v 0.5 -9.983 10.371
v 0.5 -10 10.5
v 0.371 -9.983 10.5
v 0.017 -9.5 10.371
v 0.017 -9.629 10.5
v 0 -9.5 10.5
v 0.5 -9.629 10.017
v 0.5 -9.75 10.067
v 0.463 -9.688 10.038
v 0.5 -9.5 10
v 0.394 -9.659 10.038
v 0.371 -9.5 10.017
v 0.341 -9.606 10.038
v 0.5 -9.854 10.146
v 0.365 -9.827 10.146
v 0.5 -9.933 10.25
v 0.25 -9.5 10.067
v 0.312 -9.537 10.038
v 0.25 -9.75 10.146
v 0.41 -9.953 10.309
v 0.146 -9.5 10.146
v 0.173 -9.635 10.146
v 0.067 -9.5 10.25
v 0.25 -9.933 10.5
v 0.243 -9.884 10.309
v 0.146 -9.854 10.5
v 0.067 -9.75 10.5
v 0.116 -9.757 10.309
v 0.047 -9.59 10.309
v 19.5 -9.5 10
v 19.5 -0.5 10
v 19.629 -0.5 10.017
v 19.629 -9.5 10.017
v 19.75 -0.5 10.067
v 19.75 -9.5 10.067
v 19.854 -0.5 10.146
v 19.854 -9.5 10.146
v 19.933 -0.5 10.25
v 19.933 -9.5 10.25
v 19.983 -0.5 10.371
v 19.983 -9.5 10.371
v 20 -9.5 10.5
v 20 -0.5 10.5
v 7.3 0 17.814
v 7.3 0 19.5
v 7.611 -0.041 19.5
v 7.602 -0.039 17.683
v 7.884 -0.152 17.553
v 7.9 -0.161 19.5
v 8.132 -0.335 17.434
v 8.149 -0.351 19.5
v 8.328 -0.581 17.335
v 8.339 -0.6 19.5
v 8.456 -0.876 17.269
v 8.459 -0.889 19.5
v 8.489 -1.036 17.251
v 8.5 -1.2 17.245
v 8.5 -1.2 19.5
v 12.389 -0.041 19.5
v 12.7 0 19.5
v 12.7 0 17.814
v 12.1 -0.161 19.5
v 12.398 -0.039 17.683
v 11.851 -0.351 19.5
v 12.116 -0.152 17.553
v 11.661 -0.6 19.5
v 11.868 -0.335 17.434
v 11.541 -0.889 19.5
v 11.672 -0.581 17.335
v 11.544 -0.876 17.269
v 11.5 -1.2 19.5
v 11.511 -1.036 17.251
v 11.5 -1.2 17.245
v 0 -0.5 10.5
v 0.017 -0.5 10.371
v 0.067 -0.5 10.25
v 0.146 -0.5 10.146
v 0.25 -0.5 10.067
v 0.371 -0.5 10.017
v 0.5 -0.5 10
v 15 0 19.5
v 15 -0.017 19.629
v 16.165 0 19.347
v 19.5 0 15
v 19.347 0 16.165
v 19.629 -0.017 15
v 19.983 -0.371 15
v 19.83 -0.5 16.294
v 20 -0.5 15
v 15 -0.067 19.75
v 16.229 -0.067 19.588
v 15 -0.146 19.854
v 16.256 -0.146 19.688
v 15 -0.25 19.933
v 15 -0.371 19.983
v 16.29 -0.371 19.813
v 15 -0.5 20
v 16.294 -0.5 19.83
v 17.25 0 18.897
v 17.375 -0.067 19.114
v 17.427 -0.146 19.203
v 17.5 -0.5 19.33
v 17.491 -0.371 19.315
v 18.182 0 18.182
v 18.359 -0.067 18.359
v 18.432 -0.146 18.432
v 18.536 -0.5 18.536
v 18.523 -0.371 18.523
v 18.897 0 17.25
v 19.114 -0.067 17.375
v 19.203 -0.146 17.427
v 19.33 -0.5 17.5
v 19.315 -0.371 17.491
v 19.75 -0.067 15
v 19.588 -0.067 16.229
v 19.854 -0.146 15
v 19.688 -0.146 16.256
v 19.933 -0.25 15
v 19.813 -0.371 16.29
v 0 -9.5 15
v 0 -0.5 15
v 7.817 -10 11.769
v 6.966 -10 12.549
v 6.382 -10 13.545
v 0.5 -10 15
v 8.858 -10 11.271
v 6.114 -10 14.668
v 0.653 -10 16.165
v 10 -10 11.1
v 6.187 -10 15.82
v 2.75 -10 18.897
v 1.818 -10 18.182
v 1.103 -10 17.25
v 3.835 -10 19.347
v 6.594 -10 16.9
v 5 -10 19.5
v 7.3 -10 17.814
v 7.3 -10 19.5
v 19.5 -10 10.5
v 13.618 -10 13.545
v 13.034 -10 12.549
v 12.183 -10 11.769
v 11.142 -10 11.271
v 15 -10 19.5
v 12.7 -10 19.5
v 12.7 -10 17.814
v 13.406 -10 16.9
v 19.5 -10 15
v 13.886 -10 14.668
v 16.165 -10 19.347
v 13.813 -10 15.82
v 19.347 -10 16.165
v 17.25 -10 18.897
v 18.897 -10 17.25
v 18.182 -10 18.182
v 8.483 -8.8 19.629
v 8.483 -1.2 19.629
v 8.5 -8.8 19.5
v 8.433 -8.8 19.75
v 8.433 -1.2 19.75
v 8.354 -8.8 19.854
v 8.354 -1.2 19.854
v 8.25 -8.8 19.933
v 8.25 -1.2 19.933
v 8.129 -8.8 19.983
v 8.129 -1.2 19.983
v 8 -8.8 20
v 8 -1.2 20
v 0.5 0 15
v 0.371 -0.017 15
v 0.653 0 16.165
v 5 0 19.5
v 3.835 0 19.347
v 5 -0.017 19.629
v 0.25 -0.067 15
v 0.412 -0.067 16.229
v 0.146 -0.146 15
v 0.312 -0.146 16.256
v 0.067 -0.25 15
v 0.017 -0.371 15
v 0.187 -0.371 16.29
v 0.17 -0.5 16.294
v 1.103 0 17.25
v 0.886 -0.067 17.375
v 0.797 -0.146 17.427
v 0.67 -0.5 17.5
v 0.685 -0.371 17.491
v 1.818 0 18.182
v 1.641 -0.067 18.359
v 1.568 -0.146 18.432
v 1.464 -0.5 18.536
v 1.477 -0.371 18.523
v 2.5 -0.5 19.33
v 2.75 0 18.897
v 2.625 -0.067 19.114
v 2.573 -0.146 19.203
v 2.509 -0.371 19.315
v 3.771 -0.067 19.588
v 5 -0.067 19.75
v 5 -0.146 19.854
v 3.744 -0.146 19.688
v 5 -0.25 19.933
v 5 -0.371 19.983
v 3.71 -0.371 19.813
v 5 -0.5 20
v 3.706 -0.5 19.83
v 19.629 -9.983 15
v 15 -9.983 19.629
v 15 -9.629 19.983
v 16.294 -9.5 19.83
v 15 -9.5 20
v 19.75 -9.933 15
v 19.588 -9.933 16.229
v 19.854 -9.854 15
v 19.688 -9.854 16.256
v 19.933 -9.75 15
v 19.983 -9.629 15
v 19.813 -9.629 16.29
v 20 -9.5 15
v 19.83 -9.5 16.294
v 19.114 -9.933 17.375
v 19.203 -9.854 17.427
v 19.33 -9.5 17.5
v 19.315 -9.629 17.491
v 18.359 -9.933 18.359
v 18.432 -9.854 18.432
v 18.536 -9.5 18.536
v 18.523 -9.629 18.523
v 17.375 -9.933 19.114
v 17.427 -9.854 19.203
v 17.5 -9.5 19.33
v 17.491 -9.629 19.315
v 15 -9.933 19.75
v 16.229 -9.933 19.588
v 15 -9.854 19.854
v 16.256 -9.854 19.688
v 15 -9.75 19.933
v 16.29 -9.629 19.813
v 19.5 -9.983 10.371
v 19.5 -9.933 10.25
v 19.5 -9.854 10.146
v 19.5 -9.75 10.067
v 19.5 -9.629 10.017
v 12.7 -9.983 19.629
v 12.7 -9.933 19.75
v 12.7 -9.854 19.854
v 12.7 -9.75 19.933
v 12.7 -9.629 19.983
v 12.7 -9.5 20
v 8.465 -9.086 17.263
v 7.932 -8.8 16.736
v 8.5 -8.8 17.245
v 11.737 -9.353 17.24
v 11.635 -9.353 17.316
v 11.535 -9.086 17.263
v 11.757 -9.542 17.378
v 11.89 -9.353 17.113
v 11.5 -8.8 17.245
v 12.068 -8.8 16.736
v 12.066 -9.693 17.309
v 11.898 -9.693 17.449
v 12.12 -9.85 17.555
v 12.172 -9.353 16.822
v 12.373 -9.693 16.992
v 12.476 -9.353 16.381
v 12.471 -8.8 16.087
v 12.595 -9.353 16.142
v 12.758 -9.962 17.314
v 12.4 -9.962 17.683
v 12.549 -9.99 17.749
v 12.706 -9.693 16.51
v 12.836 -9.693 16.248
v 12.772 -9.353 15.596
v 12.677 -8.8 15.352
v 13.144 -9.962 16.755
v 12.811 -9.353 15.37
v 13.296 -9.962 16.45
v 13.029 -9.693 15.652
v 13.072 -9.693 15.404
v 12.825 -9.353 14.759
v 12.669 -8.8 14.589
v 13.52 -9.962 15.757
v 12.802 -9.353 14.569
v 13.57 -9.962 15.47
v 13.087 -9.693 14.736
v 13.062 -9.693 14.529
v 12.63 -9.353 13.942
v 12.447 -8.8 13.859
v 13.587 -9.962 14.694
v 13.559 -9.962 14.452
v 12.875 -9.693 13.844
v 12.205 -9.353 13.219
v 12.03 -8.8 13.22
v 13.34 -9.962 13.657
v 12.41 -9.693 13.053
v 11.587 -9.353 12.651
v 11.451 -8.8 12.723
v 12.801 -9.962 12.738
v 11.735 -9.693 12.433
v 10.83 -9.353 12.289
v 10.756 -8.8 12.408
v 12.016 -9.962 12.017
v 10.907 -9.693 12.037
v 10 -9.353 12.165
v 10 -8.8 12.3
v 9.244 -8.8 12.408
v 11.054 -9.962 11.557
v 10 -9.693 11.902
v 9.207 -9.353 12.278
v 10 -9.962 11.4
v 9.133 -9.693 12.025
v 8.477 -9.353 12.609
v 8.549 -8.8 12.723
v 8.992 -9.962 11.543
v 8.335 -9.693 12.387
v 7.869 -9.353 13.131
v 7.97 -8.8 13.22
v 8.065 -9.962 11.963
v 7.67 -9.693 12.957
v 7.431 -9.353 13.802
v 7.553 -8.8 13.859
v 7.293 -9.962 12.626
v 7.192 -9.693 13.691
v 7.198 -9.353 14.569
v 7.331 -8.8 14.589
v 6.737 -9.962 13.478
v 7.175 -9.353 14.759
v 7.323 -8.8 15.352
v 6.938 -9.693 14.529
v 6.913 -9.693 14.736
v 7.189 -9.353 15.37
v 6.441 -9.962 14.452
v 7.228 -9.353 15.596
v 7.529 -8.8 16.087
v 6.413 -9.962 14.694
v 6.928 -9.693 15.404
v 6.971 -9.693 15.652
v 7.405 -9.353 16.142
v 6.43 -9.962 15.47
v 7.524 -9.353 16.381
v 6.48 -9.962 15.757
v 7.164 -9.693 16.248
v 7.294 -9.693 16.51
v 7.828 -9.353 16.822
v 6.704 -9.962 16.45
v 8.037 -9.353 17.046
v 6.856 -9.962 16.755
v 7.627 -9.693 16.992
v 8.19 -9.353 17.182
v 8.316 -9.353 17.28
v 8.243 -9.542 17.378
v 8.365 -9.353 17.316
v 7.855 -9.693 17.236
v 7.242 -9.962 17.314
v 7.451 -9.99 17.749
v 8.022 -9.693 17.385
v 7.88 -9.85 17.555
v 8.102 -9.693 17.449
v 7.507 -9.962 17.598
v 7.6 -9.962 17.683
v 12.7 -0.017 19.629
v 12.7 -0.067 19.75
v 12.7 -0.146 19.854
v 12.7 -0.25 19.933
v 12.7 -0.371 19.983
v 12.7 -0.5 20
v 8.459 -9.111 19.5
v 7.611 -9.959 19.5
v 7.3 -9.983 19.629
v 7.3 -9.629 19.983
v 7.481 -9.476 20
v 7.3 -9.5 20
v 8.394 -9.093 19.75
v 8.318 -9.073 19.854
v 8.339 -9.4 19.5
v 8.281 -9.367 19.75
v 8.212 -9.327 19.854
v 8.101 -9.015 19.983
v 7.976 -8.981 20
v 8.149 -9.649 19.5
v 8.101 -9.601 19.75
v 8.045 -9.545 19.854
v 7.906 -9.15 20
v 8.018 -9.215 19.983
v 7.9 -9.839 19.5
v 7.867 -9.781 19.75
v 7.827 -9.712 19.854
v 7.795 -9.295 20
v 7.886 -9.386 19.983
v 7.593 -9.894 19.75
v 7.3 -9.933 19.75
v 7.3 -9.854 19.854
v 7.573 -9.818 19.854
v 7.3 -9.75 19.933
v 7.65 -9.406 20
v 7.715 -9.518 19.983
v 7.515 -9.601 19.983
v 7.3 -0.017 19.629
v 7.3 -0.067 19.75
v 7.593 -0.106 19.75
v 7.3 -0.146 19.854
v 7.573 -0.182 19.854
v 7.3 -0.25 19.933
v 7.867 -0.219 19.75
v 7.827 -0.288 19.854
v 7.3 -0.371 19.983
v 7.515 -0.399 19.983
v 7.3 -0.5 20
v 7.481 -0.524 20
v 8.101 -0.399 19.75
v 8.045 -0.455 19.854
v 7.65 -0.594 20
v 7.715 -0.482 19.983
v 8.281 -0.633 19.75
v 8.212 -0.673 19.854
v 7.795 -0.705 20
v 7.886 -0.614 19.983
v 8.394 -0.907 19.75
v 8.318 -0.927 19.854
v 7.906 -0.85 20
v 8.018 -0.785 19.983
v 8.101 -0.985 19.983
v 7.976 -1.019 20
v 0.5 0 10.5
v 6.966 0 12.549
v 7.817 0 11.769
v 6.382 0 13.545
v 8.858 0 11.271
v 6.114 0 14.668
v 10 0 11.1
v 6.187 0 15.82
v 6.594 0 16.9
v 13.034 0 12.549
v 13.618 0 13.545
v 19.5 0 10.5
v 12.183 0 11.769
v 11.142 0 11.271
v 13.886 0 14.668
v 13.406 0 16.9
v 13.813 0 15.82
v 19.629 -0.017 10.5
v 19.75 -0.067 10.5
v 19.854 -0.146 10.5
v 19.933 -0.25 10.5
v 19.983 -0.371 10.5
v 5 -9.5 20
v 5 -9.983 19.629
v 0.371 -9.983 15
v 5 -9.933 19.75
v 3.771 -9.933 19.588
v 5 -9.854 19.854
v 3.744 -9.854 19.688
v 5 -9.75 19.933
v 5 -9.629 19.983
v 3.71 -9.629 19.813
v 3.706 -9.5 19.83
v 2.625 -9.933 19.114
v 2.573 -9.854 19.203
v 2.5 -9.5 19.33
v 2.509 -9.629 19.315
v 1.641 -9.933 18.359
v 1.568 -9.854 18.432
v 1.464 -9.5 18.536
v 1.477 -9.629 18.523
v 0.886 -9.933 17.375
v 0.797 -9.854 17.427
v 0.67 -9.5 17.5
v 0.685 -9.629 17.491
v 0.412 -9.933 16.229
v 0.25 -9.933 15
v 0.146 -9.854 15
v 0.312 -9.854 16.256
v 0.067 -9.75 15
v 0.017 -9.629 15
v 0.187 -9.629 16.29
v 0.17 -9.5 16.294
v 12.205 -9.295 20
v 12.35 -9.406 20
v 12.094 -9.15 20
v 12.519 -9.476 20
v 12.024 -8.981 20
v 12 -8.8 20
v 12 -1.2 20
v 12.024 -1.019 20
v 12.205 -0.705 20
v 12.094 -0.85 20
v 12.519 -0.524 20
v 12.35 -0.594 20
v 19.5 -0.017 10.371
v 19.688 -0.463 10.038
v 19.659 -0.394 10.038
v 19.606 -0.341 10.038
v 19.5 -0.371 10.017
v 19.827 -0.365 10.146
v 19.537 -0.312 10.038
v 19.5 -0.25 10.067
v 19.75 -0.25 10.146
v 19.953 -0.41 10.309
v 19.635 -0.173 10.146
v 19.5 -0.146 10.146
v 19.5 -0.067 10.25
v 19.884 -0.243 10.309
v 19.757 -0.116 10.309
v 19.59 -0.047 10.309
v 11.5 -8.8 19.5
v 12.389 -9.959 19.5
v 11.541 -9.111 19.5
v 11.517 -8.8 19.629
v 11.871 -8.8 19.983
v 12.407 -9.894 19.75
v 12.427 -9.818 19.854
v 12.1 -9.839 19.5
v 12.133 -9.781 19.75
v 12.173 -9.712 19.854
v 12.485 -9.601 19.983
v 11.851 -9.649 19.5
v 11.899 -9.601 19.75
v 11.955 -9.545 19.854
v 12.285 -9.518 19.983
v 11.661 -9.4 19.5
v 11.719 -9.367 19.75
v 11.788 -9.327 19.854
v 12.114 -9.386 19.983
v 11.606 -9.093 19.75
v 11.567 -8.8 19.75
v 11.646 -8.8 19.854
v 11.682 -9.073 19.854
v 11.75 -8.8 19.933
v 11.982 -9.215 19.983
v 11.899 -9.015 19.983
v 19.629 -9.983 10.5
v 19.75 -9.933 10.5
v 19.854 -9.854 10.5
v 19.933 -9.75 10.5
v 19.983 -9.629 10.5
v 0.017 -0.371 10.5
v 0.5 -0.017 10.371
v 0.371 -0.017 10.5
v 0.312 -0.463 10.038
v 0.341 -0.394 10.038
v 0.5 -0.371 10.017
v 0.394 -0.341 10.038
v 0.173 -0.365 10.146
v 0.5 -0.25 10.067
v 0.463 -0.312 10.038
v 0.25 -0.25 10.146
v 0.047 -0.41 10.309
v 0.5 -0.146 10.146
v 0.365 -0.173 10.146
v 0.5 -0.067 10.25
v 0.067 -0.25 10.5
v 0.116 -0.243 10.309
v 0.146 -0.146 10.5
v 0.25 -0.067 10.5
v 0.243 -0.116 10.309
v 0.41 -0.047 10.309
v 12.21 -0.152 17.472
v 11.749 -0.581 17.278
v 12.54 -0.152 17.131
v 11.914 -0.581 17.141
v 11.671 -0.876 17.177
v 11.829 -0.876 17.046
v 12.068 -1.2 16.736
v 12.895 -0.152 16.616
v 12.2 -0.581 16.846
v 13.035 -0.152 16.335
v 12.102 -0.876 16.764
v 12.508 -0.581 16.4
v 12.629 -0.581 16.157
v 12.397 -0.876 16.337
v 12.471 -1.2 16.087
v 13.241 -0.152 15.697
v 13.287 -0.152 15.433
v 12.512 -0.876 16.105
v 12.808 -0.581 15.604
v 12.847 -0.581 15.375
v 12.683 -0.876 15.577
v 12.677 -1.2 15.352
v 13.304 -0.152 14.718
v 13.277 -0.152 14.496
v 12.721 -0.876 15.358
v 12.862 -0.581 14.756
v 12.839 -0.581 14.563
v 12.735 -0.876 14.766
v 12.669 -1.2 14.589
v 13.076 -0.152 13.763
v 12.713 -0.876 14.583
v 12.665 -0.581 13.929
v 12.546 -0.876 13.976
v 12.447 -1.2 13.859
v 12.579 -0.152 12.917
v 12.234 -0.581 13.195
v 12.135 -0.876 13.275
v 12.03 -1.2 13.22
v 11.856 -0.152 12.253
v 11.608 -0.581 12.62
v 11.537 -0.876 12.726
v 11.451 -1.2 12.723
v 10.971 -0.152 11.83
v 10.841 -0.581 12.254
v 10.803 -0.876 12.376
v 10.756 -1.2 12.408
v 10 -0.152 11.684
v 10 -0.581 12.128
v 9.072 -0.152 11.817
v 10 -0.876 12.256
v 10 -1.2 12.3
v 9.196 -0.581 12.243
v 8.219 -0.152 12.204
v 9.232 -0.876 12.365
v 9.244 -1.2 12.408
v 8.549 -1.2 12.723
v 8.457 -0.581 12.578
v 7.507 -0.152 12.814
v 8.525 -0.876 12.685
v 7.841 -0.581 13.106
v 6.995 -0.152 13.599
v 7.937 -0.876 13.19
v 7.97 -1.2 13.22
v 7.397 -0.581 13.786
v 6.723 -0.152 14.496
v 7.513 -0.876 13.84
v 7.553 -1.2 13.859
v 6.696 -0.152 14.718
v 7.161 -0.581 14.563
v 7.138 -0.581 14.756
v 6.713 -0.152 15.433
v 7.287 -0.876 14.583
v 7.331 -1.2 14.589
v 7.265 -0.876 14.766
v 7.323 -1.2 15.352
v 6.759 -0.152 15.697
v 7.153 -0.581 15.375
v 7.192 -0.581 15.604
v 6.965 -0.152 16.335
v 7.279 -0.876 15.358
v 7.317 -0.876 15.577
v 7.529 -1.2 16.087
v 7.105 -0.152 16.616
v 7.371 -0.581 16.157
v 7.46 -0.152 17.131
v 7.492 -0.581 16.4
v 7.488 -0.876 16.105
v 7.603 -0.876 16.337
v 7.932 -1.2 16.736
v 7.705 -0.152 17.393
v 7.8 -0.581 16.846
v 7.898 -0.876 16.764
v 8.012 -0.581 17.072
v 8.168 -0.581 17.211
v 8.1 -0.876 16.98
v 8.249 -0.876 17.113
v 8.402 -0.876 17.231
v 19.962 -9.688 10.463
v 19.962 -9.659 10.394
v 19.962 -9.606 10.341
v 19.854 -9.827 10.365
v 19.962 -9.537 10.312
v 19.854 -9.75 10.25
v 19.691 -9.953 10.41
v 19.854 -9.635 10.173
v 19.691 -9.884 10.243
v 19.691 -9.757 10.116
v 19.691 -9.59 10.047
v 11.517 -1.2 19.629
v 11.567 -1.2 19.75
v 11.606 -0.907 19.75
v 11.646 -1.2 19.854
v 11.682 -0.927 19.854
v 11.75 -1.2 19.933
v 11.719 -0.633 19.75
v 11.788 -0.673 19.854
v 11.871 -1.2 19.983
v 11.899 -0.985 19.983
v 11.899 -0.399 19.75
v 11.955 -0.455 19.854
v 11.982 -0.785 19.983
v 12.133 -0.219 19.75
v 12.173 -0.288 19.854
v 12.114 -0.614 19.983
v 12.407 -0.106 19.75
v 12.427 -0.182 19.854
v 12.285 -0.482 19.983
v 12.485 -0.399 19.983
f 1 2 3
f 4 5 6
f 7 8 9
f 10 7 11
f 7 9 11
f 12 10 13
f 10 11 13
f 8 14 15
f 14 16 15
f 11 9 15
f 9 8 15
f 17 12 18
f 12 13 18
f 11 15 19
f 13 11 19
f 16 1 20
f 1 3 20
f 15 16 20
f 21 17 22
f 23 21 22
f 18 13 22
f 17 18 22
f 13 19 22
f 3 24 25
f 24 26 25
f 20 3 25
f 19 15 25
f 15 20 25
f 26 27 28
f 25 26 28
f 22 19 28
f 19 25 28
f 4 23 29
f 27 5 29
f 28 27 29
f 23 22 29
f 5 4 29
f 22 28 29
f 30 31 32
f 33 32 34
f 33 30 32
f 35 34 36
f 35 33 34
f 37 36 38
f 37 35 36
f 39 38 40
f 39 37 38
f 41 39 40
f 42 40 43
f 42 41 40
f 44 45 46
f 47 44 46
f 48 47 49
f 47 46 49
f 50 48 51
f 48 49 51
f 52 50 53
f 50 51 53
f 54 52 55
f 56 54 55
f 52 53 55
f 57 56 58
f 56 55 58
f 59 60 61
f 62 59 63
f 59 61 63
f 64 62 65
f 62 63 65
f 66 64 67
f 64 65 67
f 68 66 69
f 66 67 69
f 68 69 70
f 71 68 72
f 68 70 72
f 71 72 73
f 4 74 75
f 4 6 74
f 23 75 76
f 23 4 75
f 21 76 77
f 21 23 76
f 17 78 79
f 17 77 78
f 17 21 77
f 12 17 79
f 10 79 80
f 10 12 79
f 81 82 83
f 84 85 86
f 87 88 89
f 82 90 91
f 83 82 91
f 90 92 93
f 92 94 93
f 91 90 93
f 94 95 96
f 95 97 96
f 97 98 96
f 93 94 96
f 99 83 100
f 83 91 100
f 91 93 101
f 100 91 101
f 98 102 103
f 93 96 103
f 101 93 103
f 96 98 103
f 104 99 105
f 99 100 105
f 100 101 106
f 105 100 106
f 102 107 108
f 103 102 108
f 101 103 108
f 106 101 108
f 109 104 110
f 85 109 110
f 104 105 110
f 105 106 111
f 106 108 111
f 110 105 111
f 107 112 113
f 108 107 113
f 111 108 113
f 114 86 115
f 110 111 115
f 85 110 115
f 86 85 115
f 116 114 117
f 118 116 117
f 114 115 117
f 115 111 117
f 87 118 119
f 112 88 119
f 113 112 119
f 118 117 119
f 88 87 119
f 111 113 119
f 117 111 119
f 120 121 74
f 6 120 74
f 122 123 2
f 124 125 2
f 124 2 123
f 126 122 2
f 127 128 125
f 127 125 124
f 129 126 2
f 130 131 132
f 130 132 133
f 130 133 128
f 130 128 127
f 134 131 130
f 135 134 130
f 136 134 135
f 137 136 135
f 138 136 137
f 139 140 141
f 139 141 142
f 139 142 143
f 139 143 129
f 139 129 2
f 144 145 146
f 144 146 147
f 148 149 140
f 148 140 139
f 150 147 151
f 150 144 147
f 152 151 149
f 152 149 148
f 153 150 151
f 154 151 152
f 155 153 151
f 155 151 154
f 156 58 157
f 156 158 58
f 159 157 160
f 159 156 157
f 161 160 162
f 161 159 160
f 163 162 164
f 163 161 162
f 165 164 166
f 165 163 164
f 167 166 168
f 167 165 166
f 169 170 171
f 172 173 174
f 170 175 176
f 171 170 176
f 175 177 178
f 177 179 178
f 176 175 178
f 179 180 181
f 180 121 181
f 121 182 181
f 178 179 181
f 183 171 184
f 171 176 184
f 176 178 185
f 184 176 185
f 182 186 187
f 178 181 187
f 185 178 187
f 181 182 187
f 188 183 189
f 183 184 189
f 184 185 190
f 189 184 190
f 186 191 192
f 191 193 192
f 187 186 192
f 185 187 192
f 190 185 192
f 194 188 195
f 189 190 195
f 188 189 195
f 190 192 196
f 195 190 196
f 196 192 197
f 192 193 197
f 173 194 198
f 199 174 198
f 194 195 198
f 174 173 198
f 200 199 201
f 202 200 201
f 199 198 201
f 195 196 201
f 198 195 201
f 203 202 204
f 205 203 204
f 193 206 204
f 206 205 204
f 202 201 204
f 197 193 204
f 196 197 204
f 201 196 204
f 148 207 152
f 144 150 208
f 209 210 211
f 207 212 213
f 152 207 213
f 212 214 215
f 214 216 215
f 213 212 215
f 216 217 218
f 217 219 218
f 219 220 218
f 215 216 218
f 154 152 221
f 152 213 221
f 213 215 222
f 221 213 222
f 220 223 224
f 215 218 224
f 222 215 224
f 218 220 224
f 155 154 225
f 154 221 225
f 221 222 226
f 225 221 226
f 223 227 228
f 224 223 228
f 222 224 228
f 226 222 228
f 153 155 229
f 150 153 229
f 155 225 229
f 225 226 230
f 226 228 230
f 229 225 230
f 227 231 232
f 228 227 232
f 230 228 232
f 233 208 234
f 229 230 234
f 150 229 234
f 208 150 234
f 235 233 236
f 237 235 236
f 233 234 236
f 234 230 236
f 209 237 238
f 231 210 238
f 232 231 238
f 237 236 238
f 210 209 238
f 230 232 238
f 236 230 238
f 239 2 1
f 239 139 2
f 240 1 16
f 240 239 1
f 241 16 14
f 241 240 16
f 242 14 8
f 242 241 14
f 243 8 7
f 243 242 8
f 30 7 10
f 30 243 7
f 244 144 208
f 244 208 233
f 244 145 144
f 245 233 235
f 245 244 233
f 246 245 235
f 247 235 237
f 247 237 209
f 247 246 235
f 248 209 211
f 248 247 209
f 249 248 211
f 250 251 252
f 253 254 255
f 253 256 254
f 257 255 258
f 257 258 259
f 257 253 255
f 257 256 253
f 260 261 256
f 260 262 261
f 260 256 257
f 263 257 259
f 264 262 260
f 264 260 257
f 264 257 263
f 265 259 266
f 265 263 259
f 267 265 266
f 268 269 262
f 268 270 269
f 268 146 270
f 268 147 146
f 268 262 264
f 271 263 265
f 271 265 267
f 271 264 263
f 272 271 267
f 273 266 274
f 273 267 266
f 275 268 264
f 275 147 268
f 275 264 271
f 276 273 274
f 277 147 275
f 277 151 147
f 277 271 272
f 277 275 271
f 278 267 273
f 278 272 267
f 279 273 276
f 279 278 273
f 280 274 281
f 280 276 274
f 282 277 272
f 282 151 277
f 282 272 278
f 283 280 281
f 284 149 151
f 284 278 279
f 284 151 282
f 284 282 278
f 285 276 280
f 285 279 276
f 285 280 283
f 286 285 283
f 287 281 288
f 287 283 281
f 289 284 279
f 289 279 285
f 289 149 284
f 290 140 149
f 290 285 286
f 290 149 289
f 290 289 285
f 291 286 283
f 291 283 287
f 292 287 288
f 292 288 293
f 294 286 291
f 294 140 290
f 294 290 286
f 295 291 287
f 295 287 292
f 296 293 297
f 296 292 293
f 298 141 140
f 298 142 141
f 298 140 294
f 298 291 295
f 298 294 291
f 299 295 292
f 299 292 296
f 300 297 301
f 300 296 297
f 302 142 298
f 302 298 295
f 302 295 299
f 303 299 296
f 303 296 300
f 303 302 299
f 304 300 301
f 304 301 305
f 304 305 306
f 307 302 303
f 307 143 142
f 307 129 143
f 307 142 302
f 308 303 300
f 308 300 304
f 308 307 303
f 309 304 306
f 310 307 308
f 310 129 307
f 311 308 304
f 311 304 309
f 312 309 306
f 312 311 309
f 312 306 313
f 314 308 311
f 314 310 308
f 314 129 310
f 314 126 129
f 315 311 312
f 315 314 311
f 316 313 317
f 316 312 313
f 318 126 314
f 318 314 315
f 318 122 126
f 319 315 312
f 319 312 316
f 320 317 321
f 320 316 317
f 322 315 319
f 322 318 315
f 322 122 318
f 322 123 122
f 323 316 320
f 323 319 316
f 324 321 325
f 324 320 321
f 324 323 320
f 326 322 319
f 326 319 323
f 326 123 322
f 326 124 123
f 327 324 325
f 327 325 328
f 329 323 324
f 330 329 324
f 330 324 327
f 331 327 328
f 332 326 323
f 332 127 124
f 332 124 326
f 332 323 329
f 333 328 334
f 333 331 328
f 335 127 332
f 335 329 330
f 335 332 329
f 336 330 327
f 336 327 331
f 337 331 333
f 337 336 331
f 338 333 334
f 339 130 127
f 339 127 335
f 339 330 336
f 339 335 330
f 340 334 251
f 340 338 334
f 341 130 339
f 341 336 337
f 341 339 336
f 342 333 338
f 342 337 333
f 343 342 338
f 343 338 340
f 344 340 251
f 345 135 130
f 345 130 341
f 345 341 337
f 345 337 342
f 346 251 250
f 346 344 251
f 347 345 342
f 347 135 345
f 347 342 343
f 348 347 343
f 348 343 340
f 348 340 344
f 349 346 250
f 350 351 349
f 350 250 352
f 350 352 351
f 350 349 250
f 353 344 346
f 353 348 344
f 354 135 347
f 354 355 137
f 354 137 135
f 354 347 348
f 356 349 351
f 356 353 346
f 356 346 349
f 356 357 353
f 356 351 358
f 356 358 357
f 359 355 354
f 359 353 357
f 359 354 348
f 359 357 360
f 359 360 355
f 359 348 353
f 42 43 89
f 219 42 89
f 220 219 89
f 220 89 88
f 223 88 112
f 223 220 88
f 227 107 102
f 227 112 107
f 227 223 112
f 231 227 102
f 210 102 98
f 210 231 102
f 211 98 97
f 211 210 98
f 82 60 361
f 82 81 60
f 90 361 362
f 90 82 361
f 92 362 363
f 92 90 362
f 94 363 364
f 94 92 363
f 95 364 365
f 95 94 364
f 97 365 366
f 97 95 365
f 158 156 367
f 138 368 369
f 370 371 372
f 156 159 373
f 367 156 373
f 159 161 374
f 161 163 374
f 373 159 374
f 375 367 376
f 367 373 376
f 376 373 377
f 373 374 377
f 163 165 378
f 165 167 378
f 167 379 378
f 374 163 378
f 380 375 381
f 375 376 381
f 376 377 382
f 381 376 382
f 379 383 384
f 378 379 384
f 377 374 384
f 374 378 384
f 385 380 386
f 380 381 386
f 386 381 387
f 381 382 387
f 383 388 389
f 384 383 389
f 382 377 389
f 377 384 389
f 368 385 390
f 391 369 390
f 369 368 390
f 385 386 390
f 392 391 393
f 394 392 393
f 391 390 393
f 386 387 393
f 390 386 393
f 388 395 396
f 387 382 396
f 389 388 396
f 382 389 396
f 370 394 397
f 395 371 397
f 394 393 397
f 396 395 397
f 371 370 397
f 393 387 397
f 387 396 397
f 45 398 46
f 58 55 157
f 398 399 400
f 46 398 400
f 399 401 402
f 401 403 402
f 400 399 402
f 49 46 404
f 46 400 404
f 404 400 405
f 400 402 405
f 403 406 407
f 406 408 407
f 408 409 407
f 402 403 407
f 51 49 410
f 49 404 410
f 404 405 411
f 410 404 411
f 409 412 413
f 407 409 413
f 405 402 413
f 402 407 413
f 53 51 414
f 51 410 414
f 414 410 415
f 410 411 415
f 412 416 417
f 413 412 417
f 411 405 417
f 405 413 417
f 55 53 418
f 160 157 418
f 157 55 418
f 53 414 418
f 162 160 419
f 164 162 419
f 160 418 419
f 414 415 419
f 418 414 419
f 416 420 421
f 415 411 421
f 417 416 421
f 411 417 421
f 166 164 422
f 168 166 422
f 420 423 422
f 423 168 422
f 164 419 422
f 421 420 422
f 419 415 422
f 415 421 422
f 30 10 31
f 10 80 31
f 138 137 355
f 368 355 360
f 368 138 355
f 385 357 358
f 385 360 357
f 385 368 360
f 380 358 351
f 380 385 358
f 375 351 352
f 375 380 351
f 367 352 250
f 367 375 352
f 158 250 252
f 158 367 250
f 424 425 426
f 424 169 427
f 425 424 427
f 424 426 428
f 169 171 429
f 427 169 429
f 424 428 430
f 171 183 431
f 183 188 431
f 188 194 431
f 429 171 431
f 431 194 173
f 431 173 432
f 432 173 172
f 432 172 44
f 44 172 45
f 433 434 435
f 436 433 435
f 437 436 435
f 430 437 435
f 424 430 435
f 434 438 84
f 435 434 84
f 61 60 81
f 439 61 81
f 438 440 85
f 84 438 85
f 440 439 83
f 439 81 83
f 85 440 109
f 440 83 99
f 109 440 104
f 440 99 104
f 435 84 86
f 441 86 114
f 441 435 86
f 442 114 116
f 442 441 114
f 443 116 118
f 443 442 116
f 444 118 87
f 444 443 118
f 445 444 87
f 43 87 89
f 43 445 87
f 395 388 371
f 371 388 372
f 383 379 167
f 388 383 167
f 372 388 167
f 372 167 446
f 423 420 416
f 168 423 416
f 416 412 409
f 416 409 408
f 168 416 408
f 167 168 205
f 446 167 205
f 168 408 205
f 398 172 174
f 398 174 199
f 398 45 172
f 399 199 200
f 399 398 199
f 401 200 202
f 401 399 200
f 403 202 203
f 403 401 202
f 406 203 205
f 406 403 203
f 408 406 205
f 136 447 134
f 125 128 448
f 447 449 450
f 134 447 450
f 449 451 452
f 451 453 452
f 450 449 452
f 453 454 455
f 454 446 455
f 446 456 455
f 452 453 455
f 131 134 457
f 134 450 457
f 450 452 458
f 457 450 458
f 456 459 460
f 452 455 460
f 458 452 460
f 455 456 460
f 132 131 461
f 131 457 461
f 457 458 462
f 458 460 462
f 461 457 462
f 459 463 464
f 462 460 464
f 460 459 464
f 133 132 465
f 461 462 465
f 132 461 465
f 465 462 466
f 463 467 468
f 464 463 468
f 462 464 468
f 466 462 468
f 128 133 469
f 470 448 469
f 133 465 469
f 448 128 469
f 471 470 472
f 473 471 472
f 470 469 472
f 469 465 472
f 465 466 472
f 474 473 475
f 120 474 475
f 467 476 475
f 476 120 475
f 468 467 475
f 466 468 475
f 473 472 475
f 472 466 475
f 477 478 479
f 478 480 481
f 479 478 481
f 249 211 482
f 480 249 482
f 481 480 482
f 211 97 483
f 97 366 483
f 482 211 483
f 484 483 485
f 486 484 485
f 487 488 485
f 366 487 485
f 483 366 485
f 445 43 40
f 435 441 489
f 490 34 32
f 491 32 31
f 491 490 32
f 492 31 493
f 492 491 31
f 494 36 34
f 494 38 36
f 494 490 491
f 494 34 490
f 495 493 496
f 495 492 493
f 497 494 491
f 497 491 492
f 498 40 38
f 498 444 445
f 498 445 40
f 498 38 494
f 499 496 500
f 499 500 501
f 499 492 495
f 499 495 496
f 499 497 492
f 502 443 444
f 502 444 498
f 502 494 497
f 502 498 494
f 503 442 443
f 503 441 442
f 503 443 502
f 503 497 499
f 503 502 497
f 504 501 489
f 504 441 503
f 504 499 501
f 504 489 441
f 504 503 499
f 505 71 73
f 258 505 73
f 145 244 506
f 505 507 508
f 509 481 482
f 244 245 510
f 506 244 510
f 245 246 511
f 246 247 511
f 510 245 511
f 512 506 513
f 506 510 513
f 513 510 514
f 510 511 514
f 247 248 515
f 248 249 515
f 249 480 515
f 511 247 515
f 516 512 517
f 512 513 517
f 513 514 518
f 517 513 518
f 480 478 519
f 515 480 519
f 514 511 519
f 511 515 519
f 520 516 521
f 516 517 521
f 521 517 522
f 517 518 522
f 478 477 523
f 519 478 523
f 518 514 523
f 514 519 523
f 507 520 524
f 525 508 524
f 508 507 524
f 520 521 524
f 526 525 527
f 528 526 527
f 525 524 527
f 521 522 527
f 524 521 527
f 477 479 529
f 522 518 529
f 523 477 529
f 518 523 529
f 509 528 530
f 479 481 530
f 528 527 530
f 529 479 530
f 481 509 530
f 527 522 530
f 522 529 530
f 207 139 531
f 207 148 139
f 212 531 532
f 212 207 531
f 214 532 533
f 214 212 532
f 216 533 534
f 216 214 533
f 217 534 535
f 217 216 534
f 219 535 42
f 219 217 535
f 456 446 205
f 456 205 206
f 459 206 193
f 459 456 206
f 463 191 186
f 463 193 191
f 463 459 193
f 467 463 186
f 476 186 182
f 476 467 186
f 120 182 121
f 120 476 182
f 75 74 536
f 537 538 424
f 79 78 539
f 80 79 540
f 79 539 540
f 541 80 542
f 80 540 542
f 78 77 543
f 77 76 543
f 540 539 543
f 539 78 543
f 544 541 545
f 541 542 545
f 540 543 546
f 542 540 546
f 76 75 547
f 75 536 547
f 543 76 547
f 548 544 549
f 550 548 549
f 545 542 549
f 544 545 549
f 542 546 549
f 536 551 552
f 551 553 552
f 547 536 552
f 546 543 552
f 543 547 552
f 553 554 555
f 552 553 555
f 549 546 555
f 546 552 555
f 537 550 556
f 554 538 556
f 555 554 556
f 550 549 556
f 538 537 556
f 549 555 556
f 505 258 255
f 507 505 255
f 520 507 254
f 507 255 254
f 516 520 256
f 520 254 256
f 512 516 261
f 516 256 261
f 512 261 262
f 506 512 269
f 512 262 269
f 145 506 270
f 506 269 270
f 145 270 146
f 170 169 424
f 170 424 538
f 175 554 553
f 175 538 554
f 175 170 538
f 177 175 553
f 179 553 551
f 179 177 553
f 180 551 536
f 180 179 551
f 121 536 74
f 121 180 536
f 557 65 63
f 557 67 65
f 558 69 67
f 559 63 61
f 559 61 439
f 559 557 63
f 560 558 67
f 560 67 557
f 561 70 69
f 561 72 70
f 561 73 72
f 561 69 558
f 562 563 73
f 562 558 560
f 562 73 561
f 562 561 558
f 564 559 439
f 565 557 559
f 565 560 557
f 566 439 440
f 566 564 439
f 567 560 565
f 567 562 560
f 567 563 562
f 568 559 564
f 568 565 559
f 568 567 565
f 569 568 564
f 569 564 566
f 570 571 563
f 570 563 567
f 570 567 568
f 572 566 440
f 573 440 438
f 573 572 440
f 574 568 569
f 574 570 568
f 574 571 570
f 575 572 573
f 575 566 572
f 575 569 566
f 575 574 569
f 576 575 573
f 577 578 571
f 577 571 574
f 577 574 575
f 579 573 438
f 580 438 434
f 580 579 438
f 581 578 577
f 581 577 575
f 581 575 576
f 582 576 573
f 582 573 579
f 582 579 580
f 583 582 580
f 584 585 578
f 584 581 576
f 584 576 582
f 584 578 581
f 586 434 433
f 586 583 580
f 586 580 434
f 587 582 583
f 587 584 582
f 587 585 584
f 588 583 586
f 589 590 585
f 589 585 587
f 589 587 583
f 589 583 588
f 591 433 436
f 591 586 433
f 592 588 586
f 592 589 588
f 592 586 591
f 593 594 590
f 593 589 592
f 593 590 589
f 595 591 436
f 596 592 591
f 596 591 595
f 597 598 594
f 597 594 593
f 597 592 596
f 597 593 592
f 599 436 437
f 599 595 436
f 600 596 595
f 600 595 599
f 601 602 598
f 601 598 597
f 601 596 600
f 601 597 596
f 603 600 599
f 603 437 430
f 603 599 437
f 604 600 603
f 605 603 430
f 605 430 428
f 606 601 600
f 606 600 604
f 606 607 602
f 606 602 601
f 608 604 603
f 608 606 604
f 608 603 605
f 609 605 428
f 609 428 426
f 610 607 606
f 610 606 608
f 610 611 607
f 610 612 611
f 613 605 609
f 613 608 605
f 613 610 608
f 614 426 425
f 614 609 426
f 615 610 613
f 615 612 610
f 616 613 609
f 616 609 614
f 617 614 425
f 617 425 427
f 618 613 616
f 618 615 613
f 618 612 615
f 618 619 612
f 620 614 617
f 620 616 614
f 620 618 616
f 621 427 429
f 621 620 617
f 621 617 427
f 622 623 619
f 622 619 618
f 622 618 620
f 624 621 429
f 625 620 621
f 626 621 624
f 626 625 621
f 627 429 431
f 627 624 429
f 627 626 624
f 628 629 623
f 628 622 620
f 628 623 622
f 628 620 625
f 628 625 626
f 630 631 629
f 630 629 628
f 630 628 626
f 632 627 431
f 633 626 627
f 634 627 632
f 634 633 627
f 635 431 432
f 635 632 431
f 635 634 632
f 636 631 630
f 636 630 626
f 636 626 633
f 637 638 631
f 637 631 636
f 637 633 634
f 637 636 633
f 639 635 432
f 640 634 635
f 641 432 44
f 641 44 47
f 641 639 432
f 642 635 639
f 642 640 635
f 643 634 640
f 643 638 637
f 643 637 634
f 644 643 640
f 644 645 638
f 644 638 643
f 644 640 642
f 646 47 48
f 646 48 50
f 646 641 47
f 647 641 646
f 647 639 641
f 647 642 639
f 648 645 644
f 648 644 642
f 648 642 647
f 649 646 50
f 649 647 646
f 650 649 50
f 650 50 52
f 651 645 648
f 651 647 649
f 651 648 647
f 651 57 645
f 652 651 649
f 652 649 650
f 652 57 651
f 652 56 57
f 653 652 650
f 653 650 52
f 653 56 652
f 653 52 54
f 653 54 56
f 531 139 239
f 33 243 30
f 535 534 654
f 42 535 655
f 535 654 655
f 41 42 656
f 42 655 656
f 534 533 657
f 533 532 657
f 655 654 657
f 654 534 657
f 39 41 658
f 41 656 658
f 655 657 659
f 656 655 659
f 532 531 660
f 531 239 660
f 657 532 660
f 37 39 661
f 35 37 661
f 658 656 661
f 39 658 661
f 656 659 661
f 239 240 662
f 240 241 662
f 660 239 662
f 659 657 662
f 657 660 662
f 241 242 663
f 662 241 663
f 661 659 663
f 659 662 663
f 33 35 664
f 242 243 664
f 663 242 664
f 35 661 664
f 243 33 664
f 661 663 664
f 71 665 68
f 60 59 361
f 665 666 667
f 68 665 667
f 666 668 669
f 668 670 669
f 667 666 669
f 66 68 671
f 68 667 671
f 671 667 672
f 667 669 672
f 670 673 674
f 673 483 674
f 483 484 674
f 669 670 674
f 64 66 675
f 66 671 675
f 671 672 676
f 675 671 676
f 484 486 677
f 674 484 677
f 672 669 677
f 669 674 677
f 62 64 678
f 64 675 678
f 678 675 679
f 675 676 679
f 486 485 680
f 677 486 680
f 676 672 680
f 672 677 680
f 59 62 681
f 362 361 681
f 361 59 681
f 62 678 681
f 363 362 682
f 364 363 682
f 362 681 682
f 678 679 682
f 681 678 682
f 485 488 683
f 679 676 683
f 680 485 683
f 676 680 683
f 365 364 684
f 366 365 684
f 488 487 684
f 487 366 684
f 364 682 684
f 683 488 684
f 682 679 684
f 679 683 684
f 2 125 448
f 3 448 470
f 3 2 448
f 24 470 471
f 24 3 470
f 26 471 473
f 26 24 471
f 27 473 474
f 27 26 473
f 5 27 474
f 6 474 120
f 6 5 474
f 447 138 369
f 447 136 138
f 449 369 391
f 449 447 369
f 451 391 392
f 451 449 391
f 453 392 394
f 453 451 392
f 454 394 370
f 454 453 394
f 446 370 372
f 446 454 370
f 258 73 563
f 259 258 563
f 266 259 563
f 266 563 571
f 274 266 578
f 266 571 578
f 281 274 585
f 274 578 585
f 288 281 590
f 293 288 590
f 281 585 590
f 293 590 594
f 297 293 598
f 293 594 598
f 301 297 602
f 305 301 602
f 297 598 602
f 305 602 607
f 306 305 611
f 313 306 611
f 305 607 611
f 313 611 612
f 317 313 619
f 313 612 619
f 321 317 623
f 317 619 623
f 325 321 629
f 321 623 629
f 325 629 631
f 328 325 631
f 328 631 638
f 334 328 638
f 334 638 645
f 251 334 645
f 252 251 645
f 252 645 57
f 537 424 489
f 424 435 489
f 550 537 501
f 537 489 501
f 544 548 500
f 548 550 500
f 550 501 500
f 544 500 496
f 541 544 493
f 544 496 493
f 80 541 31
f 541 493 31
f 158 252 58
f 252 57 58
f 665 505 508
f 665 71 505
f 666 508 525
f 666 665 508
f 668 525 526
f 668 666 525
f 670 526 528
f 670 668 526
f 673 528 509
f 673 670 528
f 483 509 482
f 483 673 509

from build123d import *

# Parameters (mm, degrees)
F2_DEPTH = 0.8
F3_DEPTH = 10
F4_R     = 1.2
F5_R     = 5
F6_R     = 0.5


# Not quite as in the source:
# - a feature names something its author has since deleted; it is built from what else it names


with BuildPart() as f2:
    # F1 (on Front) → F2 (new body)
    with BuildSketch(Plane.XZ):
        with BuildLine():
            Line((8.5, 20), (0, 20))
            Line((0, 20), (0, 10))
            Line((0, 10), (20, 10))
            Line((20, 10), (20, 20))
            Line((20, 20), (11.5, 20))
            Line((11.5, 20), (11.5, 17.2449944321))
            ThreePointArc((11.5, 17.2449944321), (10, 12.3), (8.5, 17.2449944321))
            Line((8.5, 17.2449944321), (8.5, 20))
        make_face()
    extrude(amount=F2_DEPTH)

    # F1 (on Front) → F3 (join)
    with BuildSketch(Plane.XZ):
        with BuildLine():
            Line((8.5, 20), (0, 20))
            Line((0, 20), (0, 10))
            Line((0, 10), (20, 10))
            Line((20, 10), (20, 20))
            Line((20, 20), (11.5, 20))
            Line((11.5, 20), (11.5, 17.2449944321))
            ThreePointArc((11.5, 17.2449944321), (10, 12.3), (8.5, 17.2449944321))
            Line((8.5, 17.2449944321), (8.5, 20))
        make_face()
    extrude(amount=F3_DEPTH)

    # F4
    f4_edges = [f2.edges().sort_by_distance(p)[0] for p in [
        (10, -10, 12.3),
        (8.5, -10, 18.622497),
        (11.5, -10, 18.622497),
        (10, 0, 12.3),
        (8.5, 0, 18.622497),
        (11.5, 0, 18.622497),
    ]]
    fillet(f4_edges, radius=F4_R)

    # F5
    f5_edges = [f2.edges().sort_by_distance(p)[0] for p in [
        (20, -5, 20),
        (0, -5, 20),
    ]]
    fillet(f5_edges, radius=F5_R)

    # F6
    f6_edges = [f2.edges().sort_by_distance(p)[0] for p in [
        (1.464466, -10, 18.535534),
        (0, -10, 12.5),
        (10, -10, 10),
        (18.535534, -10, 18.535534),
        (18.535534, 0, 18.535534),
        (1.464466, 0, 18.535534),
        (20, -5, 10),
        (0, -5, 10),
        (10, 0, 10),
    ]]
    fillet(f6_edges, radius=F6_R)


solid = f2.part
